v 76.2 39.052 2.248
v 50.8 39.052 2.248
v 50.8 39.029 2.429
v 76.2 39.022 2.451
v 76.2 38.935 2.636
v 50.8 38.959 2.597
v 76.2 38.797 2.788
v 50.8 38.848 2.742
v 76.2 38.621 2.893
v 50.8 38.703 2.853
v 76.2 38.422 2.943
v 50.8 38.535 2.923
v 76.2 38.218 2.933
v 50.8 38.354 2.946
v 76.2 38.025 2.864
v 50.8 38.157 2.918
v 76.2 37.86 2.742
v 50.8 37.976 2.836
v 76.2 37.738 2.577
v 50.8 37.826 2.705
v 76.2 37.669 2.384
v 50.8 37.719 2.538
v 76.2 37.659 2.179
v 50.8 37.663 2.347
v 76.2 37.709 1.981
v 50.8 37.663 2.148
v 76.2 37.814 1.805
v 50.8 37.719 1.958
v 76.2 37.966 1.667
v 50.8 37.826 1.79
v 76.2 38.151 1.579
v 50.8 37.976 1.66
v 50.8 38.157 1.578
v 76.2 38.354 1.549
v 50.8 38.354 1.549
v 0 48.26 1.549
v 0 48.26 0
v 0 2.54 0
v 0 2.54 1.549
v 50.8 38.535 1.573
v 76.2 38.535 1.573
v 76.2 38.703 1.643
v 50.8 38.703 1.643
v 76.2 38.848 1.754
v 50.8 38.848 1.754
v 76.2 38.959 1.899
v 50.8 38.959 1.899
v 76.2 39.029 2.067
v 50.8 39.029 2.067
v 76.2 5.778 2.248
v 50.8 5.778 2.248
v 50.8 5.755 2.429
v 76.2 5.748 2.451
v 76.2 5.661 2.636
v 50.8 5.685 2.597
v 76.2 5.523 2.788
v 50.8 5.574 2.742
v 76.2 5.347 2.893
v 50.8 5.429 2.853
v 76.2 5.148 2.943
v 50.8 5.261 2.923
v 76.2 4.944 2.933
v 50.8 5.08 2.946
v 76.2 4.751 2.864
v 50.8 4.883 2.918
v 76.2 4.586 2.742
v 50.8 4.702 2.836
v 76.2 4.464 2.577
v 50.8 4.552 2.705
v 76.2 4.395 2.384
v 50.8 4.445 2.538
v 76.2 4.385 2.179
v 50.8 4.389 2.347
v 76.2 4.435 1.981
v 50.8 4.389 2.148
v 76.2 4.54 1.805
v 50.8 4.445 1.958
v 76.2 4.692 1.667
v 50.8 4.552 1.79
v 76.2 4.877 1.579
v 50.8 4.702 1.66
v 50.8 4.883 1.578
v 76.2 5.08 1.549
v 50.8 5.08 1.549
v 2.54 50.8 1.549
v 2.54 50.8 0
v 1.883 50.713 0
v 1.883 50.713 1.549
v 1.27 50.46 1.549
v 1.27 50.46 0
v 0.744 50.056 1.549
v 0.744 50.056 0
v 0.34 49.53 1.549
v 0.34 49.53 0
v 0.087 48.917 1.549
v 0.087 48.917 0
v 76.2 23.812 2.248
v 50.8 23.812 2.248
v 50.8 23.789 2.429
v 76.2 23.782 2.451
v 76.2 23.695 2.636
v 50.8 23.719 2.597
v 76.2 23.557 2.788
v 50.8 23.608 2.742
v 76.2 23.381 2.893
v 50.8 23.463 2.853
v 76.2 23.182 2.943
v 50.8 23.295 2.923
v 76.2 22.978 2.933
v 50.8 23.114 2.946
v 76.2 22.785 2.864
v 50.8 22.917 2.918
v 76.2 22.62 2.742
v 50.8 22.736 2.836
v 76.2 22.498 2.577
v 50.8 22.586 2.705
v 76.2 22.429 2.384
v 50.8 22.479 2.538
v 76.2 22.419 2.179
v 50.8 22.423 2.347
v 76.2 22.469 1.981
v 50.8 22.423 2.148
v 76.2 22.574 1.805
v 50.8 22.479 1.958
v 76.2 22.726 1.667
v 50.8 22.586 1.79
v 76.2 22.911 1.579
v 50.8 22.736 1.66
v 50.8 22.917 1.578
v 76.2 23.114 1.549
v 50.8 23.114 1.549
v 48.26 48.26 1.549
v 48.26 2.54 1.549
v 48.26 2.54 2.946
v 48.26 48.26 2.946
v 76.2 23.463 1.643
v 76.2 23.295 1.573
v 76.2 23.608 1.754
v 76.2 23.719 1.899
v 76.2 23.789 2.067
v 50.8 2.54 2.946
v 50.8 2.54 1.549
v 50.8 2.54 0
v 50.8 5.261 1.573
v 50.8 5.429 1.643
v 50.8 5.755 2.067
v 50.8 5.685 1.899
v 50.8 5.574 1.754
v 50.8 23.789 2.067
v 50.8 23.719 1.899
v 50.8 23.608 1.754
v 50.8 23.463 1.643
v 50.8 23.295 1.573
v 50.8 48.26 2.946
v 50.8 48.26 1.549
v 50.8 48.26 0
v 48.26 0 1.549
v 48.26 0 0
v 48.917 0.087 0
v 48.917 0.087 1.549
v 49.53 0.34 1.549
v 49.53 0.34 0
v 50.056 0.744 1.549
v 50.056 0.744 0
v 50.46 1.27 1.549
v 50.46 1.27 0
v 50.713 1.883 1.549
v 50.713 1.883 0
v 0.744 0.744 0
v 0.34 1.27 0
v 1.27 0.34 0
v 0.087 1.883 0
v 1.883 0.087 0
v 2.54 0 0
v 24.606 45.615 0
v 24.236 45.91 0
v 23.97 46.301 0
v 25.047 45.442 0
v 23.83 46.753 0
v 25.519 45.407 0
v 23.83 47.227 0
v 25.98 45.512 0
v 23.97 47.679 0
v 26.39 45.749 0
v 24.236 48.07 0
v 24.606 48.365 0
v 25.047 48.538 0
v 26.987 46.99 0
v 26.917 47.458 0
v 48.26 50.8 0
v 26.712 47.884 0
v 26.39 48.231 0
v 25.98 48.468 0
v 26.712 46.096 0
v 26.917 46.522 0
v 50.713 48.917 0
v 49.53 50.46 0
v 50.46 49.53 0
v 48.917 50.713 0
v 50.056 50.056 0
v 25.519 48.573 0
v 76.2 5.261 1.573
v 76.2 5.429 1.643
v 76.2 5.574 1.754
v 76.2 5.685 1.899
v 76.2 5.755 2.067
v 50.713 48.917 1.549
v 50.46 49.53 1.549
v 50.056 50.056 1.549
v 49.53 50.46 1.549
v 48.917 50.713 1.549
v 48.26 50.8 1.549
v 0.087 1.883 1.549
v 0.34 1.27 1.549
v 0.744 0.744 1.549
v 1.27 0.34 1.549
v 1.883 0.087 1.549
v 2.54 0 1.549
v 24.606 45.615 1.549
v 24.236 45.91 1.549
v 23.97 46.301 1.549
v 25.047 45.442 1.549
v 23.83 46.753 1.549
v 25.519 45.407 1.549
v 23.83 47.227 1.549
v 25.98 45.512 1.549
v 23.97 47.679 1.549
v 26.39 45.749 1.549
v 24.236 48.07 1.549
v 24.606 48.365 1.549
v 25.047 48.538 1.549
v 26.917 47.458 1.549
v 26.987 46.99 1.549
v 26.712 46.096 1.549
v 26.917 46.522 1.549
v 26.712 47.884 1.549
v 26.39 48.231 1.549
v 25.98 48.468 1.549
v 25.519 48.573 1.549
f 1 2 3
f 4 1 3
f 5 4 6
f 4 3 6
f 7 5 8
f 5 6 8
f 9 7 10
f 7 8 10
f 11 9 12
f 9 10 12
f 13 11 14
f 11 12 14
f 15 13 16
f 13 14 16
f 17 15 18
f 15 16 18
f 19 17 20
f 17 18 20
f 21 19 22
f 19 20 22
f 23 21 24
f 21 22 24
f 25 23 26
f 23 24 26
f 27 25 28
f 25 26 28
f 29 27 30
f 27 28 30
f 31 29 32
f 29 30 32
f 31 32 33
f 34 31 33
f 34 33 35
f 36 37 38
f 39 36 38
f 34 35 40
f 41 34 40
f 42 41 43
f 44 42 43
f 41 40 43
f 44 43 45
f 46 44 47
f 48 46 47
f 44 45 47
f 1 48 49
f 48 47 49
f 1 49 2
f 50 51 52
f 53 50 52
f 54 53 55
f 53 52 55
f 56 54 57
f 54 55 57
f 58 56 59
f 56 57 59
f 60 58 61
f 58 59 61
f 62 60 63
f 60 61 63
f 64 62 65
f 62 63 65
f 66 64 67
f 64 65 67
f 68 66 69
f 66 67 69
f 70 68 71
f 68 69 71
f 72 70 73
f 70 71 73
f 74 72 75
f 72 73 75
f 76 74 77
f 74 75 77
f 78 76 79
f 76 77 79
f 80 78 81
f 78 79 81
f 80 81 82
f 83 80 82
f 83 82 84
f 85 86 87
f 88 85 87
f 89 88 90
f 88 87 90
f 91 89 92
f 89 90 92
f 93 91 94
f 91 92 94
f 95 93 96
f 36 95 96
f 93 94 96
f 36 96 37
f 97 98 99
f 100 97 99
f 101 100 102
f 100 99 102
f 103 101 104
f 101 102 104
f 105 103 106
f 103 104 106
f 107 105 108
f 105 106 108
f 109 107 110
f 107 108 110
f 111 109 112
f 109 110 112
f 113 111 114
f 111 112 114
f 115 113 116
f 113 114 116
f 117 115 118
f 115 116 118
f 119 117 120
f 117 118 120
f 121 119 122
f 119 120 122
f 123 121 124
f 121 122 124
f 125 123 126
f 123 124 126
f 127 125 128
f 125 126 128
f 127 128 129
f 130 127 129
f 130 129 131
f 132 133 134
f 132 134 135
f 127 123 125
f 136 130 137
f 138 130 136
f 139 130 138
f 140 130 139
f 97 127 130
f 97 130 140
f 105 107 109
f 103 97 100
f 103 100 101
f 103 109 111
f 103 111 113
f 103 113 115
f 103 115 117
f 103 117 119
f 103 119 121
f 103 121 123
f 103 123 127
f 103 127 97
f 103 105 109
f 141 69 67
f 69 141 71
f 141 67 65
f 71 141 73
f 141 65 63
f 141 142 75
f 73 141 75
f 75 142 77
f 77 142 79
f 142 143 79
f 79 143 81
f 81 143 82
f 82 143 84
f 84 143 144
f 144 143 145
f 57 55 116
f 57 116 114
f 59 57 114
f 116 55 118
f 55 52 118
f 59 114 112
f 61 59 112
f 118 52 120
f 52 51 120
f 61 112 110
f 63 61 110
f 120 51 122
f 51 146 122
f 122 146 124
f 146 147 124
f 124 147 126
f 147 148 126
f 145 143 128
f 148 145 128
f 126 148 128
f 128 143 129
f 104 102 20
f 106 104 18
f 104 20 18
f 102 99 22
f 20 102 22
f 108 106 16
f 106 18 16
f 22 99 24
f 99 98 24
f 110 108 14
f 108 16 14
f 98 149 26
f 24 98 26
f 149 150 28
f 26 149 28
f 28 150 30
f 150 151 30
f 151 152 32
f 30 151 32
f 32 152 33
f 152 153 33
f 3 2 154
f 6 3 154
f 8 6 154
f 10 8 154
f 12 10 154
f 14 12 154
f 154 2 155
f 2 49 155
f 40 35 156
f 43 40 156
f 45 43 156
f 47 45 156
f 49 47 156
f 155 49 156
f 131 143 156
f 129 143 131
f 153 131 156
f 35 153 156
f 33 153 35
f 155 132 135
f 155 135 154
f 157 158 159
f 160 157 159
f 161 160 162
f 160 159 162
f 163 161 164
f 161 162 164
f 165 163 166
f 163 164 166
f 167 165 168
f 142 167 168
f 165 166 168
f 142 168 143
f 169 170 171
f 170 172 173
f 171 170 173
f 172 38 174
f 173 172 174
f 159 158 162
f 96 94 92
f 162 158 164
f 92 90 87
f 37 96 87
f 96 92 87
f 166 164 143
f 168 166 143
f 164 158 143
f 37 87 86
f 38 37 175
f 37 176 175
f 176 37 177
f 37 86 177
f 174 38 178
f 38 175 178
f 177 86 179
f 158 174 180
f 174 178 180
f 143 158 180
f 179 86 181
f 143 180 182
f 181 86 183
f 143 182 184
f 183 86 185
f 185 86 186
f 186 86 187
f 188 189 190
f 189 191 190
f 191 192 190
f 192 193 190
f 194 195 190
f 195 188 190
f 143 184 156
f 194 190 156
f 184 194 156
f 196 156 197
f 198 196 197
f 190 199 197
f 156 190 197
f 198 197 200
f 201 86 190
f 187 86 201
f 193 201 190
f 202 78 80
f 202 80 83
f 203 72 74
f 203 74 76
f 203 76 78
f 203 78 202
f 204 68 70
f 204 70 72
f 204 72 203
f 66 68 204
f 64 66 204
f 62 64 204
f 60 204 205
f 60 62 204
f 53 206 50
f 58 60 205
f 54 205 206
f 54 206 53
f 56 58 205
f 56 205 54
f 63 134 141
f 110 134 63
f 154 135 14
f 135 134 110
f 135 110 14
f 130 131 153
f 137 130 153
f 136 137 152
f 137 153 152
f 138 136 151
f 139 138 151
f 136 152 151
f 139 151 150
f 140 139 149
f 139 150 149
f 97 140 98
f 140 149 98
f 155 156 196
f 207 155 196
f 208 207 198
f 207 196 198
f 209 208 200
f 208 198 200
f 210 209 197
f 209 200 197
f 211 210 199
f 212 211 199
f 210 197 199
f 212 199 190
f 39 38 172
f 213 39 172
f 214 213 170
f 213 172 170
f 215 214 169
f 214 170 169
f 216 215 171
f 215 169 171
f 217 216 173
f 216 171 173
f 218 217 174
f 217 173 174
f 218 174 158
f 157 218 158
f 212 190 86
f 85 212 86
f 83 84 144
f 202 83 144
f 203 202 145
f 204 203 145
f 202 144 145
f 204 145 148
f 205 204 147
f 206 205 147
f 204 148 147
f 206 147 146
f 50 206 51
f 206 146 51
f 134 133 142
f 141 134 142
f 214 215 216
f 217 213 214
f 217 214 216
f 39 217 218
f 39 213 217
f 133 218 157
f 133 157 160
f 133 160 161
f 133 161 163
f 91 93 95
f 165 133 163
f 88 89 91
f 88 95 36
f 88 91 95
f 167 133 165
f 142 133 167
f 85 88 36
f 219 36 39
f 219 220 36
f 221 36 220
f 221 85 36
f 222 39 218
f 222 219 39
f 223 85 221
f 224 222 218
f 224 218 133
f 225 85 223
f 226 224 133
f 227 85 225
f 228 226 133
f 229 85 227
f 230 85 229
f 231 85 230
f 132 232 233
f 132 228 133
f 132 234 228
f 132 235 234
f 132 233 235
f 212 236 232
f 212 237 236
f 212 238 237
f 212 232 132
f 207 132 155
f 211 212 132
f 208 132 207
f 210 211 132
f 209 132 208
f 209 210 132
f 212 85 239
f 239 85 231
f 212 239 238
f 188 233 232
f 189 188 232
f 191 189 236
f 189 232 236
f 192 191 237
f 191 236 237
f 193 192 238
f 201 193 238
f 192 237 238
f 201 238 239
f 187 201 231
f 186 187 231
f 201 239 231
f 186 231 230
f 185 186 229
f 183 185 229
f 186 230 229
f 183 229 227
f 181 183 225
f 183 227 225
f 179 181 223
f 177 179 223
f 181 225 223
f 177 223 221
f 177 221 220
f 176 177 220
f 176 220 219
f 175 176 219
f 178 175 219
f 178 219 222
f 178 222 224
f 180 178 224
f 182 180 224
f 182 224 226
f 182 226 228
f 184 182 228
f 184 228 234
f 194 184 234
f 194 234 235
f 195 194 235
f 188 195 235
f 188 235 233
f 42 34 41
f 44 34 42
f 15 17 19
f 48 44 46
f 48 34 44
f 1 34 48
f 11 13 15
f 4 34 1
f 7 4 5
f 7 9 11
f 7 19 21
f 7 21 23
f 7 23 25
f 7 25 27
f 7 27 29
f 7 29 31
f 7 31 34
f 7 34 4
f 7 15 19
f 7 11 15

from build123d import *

# Parameters (mm, degrees)
F1_DEPTH = 1.5494
F2_R     = 1.5875
F3_DEPTH = 25.4
F5_W     = 2.54
F5_H     = 45.72
F6_DEPTH = 1.397
F7_DEPTH = 25.4


# Not quite as in the source:
# - a feature names something its author has since deleted; it is built from what else it names


with BuildPart() as f1:
    # F0 (on Top) → F1 (new body)
    with BuildSketch(Plane.XY):
        with BuildLine():
            ThreePointArc((0, 2.54), (0.7439487758, 0.7439487758), (2.54, 0))
            Line((2.54, 0), (48.26, 0))
            ThreePointArc((48.26, 0), (50.0560512242, 0.7439487758), (50.8, 2.54))
            Line((50.8, 2.54), (50.8, 48.26))
            ThreePointArc((50.8, 48.26), (50.0560512242, 50.0560512242), (48.26, 50.8))
            Line((48.26, 50.8), (2.54, 50.8))
            ThreePointArc((2.54, 50.8), (0.7439487758, 50.0560512242), (0, 48.26))
            Line((0, 48.26), (0, 2.54))
        make_face()
    extrude(amount=F1_DEPTH)

    # F2 (on face) → F3 (cut)
    with BuildSketch(Plane.XY.offset(1.5494)):
        with Locations((25.4, 46.99)):
            Circle(F2_R)
    extrude(amount=-F3_DEPTH, mode=Mode.SUBTRACT)

    # F5 (on face) → F6 (join)
    with BuildSketch(Plane.XY.offset(1.5494)):
        with Locations((49.53, 25.4)):
            Rectangle(F5_W, F5_H)
    extrude(amount=F6_DEPTH)

    # F4 (on face) → F7 (join)
    with BuildSketch(Plane.YZ.offset(50.8)):
        with BuildLine():
            ThreePointArc((5.0799999892, 1.5494), (5.5739140828, 1.7539859095), (5.7785, 2.2479))
            ThreePointArc((5.7785, 2.2479), (4.5860859172, 2.7418140905), (5.0799999892, 1.5494))
        make_face()
        with BuildLine():
            ThreePointArc((23.8125, 2.2479), (22.6200859133, 2.7418140867), (23.114, 1.5494))
            ThreePointArc((23.114, 1.5494), (23.6079140867, 1.7539859133), (23.8125, 2.2479))
        make_face()
        with BuildLine():
            ThreePointArc((39.0525, 2.2479), (37.8600859133, 2.7418140867), (38.354, 1.5494))
            ThreePointArc((38.354, 1.5494), (38.8479140867, 1.7539859133), (39.0525, 2.2479))
        make_face()
    extrude(amount=F7_DEPTH)


solid = f1.part
